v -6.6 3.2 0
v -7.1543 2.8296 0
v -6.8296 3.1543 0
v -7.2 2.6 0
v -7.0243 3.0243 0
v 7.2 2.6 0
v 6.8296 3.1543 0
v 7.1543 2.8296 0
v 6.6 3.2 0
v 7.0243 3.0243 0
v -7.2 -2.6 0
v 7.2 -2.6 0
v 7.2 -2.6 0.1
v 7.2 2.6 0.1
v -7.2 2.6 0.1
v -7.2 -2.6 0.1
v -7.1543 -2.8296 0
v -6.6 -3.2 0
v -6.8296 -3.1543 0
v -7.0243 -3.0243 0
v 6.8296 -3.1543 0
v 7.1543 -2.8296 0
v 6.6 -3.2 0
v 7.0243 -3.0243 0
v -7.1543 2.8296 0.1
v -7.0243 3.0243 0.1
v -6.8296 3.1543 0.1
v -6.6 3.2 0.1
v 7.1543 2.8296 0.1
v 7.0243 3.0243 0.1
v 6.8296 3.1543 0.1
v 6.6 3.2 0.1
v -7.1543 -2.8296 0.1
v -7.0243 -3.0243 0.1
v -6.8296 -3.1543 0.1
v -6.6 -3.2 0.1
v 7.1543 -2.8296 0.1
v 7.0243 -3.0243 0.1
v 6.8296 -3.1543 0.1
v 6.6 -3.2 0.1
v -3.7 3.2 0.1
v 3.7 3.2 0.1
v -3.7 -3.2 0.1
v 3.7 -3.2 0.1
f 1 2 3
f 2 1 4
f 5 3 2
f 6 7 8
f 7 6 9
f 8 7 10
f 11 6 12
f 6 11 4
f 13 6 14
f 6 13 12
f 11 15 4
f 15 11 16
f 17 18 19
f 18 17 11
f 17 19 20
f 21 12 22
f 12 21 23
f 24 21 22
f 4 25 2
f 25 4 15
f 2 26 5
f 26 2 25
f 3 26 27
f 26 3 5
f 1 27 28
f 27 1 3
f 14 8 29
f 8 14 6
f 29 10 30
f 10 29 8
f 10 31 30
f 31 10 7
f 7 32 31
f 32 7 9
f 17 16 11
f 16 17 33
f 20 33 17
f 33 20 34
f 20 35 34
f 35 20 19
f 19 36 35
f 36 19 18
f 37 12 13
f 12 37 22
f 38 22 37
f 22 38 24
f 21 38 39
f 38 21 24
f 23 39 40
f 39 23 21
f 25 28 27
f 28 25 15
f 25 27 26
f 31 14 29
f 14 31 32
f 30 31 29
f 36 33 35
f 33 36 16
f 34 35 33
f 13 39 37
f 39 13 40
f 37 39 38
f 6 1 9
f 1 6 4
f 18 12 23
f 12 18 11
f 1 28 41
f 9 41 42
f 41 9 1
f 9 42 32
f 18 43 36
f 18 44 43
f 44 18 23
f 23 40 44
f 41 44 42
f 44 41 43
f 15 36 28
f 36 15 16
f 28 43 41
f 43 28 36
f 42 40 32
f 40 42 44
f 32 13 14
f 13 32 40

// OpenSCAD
// file: ../p/box3u12.scad
use <../lib.scad>
function ldraw_lib__box3u12() = [
// 0 Box with 3 Parallel Faces without Any Edges
// 0 Name: box3u12.dat
// 0 Author: J.C. Tchang [tchang]
// 0 !LDRAW_ORG Primitive UPDATE 2014-02
// 0 !LICENSE Licensed under CC BY 4.0 : see CAreadme.txt
// 
// 0 BFC CERTIFY CCW
  [0,"BFC","CERTIFY"],
  [0,"BFC","CCW"],
// 
// 0 !HISTORY 2014-12-23 [PTadmin] Official Update 2014-02
// 
// 
// 4 16 -1 1 1 1 1 1 1 1 -1 -1 1 -1
  [4,16,-1,1,1,1,1,1,1,1,-1,-1,1,-1],
// 4 16 -1 1 1 -1 0 1 1 0 1 1 1 1
  [4,16,-1,1,1,-1,0,1,1,0,1,1,1,1],
// 4 16 1 1 -1 1 0 -1 -1 0 -1 -1 1 -1
  [4,16,1,1,-1,1,0,-1,-1,0,-1,-1,1,-1],
];
module ldraw_lib__box3u12(step=0, col=false, unit=2/5, alt=false, line=0.2, solid=!$preview)
    makepoly(ldraw_lib__box3u12(), step=step, col=col, unit=unit, alt=alt, line=line, solid=solid);
ldraw_lib__box3u12(line=0.2);
// file: ../p/1-4cyli.scad
use <../lib.scad>
function ldraw_lib__1_4cyli() = [
// 0 Cylinder 0.25
// 0 Name: 1-4cyli.dat
// 0 Author: James Jessiman
// 0 !LDRAW_ORG Primitive UPDATE 2012-01
// 0 !LICENSE Licensed under CC BY 4.0 : see CAreadme.txt
// 
// 0 BFC CERTIFY CCW
  [0,"BFC","CERTIFY"],
  [0,"BFC","CCW"],
// 
// 0 !HISTORY 2002-03-23 [sbliss] Added BFC statement.
// 0 !HISTORY 2002-04-25 [PTadmin] Official Update 2002-02
// 0 !HISTORY 2007-06-22 [PTadmin] Header formatted for Contributor Agreement
// 0 !HISTORY 2008-07-01 [PTadmin] Official Update 2008-01
// 0 !HISTORY 2012-02-16 [Philo] Changed to CCW
// 0 !HISTORY 2012-03-30 [PTadmin] Official Update 2012-01
// 
// 
// 4 16 1 1 0 0.9239 1 0.3827 0.9239 0 0.3827 1 0 0
  [4,16,1,1,0,0.9239,1,0.3827,0.9239,0,0.3827,1,0,0],
// 5 24 1 0 0 1 1 0 0.9239 0 0.3827 1 0 -1
  [5,24,1,0,0,1,1,0,0.9239,0,0.3827,1,0,-1],
// 4 16 0.9239 1 0.3827 0.7071 1 0.7071 0.7071 0 0.7071 0.9239 0 0.3827
  [4,16,0.9239,1,0.3827,0.7071,1,0.7071,0.7071,0,0.7071,0.9239,0,0.3827],
// 5 24 0.9239 0 0.3827 0.9239 1 0.3827 0.7071 0 0.7071 1 0 0
  [5,24,0.9239,0,0.3827,0.9239,1,0.3827,0.7071,0,0.7071,1,0,0],
// 4 16 0.7071 1 0.7071 0.3827 1 0.9239 0.3827 0 0.9239 0.7071 0 0.7071
  [4,16,0.7071,1,0.7071,0.3827,1,0.9239,0.3827,0,0.9239,0.7071,0,0.7071],
// 5 24 0.7071 0 0.7071 0.7071 1 0.7071 0.3827 0 0.9239 0.9239 0 0.3827
  [5,24,0.7071,0,0.7071,0.7071,1,0.7071,0.3827,0,0.9239,0.9239,0,0.3827],
// 4 16 0.3827 1 0.9239 0 1 1 0 0 1 0.3827 0 0.9239
  [4,16,0.3827,1,0.9239,0,1,1,0,0,1,0.3827,0,0.9239],
// 5 24 0.3827 0 0.9239 0.3827 1 0.9239 0 0 1 0.7071 0 0.7071
  [5,24,0.3827,0,0.9239,0.3827,1,0.9239,0,0,1,0.7071,0,0.7071],
// 5 24 0 0 1 0 1 1 0.3827 0 0.9239 -1 0 1
  [5,24,0,0,1,0,1,1,0.3827,0,0.9239,-1,0,1],
];
module ldraw_lib__1_4cyli(step=0, col=false, unit=2/5, alt=false, line=0.2, solid=!$preview)
    makepoly(ldraw_lib__1_4cyli(), step=step, col=col, unit=unit, alt=alt, line=line, solid=solid);
ldraw_lib__1_4cyli(line=0.2);
// file: ../p/1-4chrd.scad
use <../lib.scad>
function ldraw_lib__1_4chrd() = [
// 0 Chord 0.25
// 0 Name: 1-4chrd.dat
// 0 Author: Tony Hafner [hafhead]
// 0 !LDRAW_ORG Primitive UPDATE 2012-02
// 0 !LICENSE Licensed under CC BY 2.0 and CC BY 4.0 : see CAreadme.txt
// 
// 0 BFC CERTIFY CCW
  [0,"BFC","CERTIFY"],
  [0,"BFC","CCW"],
// 
// 0 !HISTORY 2004-04-22 [PTadmin] Official Update 2004-02
// 0 !HISTORY 2007-10-09 [PTadmin] Header formatted for Contributor Agreement
// 0 !HISTORY 2008-07-01 [PTadmin] Official Update 2008-01
// 0 !HISTORY 2012-08-02 [MMR1988] Re-creation with PrimGen2 and Rectifier
// 0 !HISTORY 2012-08-09 [PTadmin] Official Update 2012-02
// 
// 
// 4 16 0.9239 0 0.3827 0.3827 0 0.9239 0 0 1 1 0 0
  [4,16,0.9239,0,0.3827,0.3827,0,0.9239,0,0,1,1,0,0],
// 3 16 0.7071 0 0.7071 0.3827 0 0.9239 0.9239 0 0.3827
  [3,16,0.7071,0,0.7071,0.3827,0,0.9239,0.9239,0,0.3827],
];
module ldraw_lib__1_4chrd(step=0, col=false, unit=2/5, alt=false, line=0.2, solid=!$preview)
    makepoly(ldraw_lib__1_4chrd(), step=step, col=col, unit=unit, alt=alt, line=line, solid=solid);
ldraw_lib__1_4chrd(line=0.2);
// main file
use <../lib.scad>
use <../p/1-4chrd.scad>
use <../p/1-4cyli.scad>
use <../p/box3u12.scad>
function ldraw_lib__6142617d() = [
// 0 Sticker  0.8 x  1.8 with Black Stripe on White Background
// 0 Name: 6142617d.dat
// 0 Author: Massimo Maso [Sirio]
// 0 !LDRAW_ORG Part UPDATE 2022-04
// 0 !LICENSE Licensed under CC BY 4.0 : see CAreadme.txt
// 
// 0 BFC CERTIFY CCW
  [0,"BFC","CERTIFY"],
  [0,"BFC","CCW"],
// 
// 0 !KEYWORDS 1969, Camaro, Chevrolet, Drag, Race, Set 75874, Speed Champions
// 0 !KEYWORDS Z/28
// 
// 0 !HISTORY 2022-07-18 [PTadmin] Official Update 2022-04
// 
// 
// 0 // Primitives
// 
// 1 16 -16.5 0 6.5 -1.5 0 0 0 -1 0 0 0 1.5 1-4chrd.dat
  [1,16,-16.5,0,6.5,-1.5,0,0,0,-1,0,0,0,1.5, ldraw_lib__1_4chrd()],
// 1 16 16.5 0 6.5 1.5 0 0 0 -1 0 0 0 1.5 1-4chrd.dat
  [1,16,16.5,0,6.5,1.5,0,0,0,-1,0,0,0,1.5, ldraw_lib__1_4chrd()],
// 1 16 0 -.25 0 0 0 18 0 .25 0 6.5 0 0 box3u12.dat
  [1,16,0,-.25,0,0,0,18,0,.25,0,6.5,0,0, ldraw_lib__box3u12()],
// 1 16 -16.5 0 -6.5 -1.5 0 0 0 -1 0 0 0 -1.5 1-4chrd.dat
  [1,16,-16.5,0,-6.5,-1.5,0,0,0,-1,0,0,0,-1.5, ldraw_lib__1_4chrd()],
// 1 16 16.5 0 -6.5 1.5 0 0 0 -1 0 0 0 -1.5 1-4chrd.dat
  [1,16,16.5,0,-6.5,1.5,0,0,0,-1,0,0,0,-1.5, ldraw_lib__1_4chrd()],
// 1 16 -16.5 0 6.5 -1.5 0 0 0 -.25 0 0 0 1.5 1-4cyli.dat
  [1,16,-16.5,0,6.5,-1.5,0,0,0,-.25,0,0,0,1.5, ldraw_lib__1_4cyli()],
// 1 16 16.5 0 6.5 1.5 0 0 0 -.25 0 0 0 1.5 1-4cyli.dat
  [1,16,16.5,0,6.5,1.5,0,0,0,-.25,0,0,0,1.5, ldraw_lib__1_4cyli()],
// 1 16 -16.5 0 -6.5 -1.5 0 0 0 -.25 0 0 0 -1.5 1-4cyli.dat
  [1,16,-16.5,0,-6.5,-1.5,0,0,0,-.25,0,0,0,-1.5, ldraw_lib__1_4cyli()],
// 1 16 16.5 0 -6.5 1.5 0 0 0 -.25 0 0 0 -1.5 1-4cyli.dat
  [1,16,16.5,0,-6.5,1.5,0,0,0,-.25,0,0,0,-1.5, ldraw_lib__1_4cyli()],
// 1 15 -16.5 -.25 6.5 -1.5 0 0 0 1 0 0 0 1.5 1-4chrd.dat
  [1,15,-16.5,-.25,6.5,-1.5,0,0,0,1,0,0,0,1.5, ldraw_lib__1_4chrd()],
// 1 15 16.5 -.25 6.5 1.5 0 0 0 1 0 0 0 1.5 1-4chrd.dat
  [1,15,16.5,-.25,6.5,1.5,0,0,0,1,0,0,0,1.5, ldraw_lib__1_4chrd()],
// 1 15 -16.5 -.25 -6.5 -1.5 0 0 0 1 0 0 0 -1.5 1-4chrd.dat
  [1,15,-16.5,-.25,-6.5,-1.5,0,0,0,1,0,0,0,-1.5, ldraw_lib__1_4chrd()],
// 1 15 16.5 -.25 -6.5 1.5 0 0 0 1 0 0 0 -1.5 1-4chrd.dat
  [1,15,16.5,-.25,-6.5,1.5,0,0,0,1,0,0,0,-1.5, ldraw_lib__1_4chrd()],
// 0 // Bottom face
// 4 16 16.5 0 8 18 0 6.5 -18 0 6.5 -16.5 0 8
  [4,16,16.5,0,8,18,0,6.5,-18,0,6.5,-16.5,0,8],
// 4 16 16.5 0 -8 -16.5 0 -8 -18 0 -6.5 18 0 -6.5
  [4,16,16.5,0,-8,-16.5,0,-8,-18,0,-6.5,18,0,-6.5],
// 0 // Lateral face
// 3 16 -16.5 0 8 -16.5 -.25 8 -9.25 -.25 8
  [3,16,-16.5,0,8,-16.5,-.25,8,-9.25,-.25,8],
// 4 16 -16.5 0 8 -9.25 -.25 8 9.25 -.25 8 16.5 0 8
  [4,16,-16.5,0,8,-9.25,-.25,8,9.25,-.25,8,16.5,0,8],
// 3 16 16.5 0 8 9.25 -.25 8 16.5 -.25 8
  [3,16,16.5,0,8,9.25,-.25,8,16.5,-.25,8],
// 3 16 -16.5 0 -8 -9.25 -.25 -8 -16.5 -.25 -8
  [3,16,-16.5,0,-8,-9.25,-.25,-8,-16.5,-.25,-8],
// 4 16 -16.5 0 -8 16.5 0 -8 9.25 -.25 -8 -9.25 -.25 -8
  [4,16,-16.5,0,-8,16.5,0,-8,9.25,-.25,-8,-9.25,-.25,-8],
// 3 16 16.5 0 -8 16.5 -.25 -8 9.25 -.25 -8
  [3,16,16.5,0,-8,16.5,-.25,-8,9.25,-.25,-8],
// 0 // Top face
// 0 // Black face
// 4 0 -9.25 -.25 8 -9.25 -.25 -8 9.25 -.25 -8 9.25 -.25 8
  [4,0,-9.25,-.25,8,-9.25,-.25,-8,9.25,-.25,-8,9.25,-.25,8],
// 0 // White faces
// 4 15 -16.5 -.25 8 -18 -.25 6.5 -18 -.25 -6.5 -16.5 -.25 -8
  [4,15,-16.5,-.25,8,-18,-.25,6.5,-18,-.25,-6.5,-16.5,-.25,-8],
// 4 15 -16.5 -.25 8 -16.5 -.25 -8 -9.25 -.25 -8 -9.25 -.25 8
  [4,15,-16.5,-.25,8,-16.5,-.25,-8,-9.25,-.25,-8,-9.25,-.25,8],
// 4 15 16.5 -.25 8 9.25 -.25 8 9.25 -.25 -8 16.5 -.25 -8
  [4,15,16.5,-.25,8,9.25,-.25,8,9.25,-.25,-8,16.5,-.25,-8],
// 4 15 16.5 -.25 8 16.5 -.25 -8 18 -.25 -6.5 18 -.25 6.5
  [4,15,16.5,-.25,8,16.5,-.25,-8,18,-.25,-6.5,18,-.25,6.5],
];
module ldraw_lib__6142617d(step=0, col=false, unit=2/5, alt=false, line=0.2, solid=!$preview)
    makepoly(ldraw_lib__6142617d(), step=step, col=col, unit=unit, alt=alt, line=line, solid=solid);
ldraw_lib__6142617d(line=0.2);
